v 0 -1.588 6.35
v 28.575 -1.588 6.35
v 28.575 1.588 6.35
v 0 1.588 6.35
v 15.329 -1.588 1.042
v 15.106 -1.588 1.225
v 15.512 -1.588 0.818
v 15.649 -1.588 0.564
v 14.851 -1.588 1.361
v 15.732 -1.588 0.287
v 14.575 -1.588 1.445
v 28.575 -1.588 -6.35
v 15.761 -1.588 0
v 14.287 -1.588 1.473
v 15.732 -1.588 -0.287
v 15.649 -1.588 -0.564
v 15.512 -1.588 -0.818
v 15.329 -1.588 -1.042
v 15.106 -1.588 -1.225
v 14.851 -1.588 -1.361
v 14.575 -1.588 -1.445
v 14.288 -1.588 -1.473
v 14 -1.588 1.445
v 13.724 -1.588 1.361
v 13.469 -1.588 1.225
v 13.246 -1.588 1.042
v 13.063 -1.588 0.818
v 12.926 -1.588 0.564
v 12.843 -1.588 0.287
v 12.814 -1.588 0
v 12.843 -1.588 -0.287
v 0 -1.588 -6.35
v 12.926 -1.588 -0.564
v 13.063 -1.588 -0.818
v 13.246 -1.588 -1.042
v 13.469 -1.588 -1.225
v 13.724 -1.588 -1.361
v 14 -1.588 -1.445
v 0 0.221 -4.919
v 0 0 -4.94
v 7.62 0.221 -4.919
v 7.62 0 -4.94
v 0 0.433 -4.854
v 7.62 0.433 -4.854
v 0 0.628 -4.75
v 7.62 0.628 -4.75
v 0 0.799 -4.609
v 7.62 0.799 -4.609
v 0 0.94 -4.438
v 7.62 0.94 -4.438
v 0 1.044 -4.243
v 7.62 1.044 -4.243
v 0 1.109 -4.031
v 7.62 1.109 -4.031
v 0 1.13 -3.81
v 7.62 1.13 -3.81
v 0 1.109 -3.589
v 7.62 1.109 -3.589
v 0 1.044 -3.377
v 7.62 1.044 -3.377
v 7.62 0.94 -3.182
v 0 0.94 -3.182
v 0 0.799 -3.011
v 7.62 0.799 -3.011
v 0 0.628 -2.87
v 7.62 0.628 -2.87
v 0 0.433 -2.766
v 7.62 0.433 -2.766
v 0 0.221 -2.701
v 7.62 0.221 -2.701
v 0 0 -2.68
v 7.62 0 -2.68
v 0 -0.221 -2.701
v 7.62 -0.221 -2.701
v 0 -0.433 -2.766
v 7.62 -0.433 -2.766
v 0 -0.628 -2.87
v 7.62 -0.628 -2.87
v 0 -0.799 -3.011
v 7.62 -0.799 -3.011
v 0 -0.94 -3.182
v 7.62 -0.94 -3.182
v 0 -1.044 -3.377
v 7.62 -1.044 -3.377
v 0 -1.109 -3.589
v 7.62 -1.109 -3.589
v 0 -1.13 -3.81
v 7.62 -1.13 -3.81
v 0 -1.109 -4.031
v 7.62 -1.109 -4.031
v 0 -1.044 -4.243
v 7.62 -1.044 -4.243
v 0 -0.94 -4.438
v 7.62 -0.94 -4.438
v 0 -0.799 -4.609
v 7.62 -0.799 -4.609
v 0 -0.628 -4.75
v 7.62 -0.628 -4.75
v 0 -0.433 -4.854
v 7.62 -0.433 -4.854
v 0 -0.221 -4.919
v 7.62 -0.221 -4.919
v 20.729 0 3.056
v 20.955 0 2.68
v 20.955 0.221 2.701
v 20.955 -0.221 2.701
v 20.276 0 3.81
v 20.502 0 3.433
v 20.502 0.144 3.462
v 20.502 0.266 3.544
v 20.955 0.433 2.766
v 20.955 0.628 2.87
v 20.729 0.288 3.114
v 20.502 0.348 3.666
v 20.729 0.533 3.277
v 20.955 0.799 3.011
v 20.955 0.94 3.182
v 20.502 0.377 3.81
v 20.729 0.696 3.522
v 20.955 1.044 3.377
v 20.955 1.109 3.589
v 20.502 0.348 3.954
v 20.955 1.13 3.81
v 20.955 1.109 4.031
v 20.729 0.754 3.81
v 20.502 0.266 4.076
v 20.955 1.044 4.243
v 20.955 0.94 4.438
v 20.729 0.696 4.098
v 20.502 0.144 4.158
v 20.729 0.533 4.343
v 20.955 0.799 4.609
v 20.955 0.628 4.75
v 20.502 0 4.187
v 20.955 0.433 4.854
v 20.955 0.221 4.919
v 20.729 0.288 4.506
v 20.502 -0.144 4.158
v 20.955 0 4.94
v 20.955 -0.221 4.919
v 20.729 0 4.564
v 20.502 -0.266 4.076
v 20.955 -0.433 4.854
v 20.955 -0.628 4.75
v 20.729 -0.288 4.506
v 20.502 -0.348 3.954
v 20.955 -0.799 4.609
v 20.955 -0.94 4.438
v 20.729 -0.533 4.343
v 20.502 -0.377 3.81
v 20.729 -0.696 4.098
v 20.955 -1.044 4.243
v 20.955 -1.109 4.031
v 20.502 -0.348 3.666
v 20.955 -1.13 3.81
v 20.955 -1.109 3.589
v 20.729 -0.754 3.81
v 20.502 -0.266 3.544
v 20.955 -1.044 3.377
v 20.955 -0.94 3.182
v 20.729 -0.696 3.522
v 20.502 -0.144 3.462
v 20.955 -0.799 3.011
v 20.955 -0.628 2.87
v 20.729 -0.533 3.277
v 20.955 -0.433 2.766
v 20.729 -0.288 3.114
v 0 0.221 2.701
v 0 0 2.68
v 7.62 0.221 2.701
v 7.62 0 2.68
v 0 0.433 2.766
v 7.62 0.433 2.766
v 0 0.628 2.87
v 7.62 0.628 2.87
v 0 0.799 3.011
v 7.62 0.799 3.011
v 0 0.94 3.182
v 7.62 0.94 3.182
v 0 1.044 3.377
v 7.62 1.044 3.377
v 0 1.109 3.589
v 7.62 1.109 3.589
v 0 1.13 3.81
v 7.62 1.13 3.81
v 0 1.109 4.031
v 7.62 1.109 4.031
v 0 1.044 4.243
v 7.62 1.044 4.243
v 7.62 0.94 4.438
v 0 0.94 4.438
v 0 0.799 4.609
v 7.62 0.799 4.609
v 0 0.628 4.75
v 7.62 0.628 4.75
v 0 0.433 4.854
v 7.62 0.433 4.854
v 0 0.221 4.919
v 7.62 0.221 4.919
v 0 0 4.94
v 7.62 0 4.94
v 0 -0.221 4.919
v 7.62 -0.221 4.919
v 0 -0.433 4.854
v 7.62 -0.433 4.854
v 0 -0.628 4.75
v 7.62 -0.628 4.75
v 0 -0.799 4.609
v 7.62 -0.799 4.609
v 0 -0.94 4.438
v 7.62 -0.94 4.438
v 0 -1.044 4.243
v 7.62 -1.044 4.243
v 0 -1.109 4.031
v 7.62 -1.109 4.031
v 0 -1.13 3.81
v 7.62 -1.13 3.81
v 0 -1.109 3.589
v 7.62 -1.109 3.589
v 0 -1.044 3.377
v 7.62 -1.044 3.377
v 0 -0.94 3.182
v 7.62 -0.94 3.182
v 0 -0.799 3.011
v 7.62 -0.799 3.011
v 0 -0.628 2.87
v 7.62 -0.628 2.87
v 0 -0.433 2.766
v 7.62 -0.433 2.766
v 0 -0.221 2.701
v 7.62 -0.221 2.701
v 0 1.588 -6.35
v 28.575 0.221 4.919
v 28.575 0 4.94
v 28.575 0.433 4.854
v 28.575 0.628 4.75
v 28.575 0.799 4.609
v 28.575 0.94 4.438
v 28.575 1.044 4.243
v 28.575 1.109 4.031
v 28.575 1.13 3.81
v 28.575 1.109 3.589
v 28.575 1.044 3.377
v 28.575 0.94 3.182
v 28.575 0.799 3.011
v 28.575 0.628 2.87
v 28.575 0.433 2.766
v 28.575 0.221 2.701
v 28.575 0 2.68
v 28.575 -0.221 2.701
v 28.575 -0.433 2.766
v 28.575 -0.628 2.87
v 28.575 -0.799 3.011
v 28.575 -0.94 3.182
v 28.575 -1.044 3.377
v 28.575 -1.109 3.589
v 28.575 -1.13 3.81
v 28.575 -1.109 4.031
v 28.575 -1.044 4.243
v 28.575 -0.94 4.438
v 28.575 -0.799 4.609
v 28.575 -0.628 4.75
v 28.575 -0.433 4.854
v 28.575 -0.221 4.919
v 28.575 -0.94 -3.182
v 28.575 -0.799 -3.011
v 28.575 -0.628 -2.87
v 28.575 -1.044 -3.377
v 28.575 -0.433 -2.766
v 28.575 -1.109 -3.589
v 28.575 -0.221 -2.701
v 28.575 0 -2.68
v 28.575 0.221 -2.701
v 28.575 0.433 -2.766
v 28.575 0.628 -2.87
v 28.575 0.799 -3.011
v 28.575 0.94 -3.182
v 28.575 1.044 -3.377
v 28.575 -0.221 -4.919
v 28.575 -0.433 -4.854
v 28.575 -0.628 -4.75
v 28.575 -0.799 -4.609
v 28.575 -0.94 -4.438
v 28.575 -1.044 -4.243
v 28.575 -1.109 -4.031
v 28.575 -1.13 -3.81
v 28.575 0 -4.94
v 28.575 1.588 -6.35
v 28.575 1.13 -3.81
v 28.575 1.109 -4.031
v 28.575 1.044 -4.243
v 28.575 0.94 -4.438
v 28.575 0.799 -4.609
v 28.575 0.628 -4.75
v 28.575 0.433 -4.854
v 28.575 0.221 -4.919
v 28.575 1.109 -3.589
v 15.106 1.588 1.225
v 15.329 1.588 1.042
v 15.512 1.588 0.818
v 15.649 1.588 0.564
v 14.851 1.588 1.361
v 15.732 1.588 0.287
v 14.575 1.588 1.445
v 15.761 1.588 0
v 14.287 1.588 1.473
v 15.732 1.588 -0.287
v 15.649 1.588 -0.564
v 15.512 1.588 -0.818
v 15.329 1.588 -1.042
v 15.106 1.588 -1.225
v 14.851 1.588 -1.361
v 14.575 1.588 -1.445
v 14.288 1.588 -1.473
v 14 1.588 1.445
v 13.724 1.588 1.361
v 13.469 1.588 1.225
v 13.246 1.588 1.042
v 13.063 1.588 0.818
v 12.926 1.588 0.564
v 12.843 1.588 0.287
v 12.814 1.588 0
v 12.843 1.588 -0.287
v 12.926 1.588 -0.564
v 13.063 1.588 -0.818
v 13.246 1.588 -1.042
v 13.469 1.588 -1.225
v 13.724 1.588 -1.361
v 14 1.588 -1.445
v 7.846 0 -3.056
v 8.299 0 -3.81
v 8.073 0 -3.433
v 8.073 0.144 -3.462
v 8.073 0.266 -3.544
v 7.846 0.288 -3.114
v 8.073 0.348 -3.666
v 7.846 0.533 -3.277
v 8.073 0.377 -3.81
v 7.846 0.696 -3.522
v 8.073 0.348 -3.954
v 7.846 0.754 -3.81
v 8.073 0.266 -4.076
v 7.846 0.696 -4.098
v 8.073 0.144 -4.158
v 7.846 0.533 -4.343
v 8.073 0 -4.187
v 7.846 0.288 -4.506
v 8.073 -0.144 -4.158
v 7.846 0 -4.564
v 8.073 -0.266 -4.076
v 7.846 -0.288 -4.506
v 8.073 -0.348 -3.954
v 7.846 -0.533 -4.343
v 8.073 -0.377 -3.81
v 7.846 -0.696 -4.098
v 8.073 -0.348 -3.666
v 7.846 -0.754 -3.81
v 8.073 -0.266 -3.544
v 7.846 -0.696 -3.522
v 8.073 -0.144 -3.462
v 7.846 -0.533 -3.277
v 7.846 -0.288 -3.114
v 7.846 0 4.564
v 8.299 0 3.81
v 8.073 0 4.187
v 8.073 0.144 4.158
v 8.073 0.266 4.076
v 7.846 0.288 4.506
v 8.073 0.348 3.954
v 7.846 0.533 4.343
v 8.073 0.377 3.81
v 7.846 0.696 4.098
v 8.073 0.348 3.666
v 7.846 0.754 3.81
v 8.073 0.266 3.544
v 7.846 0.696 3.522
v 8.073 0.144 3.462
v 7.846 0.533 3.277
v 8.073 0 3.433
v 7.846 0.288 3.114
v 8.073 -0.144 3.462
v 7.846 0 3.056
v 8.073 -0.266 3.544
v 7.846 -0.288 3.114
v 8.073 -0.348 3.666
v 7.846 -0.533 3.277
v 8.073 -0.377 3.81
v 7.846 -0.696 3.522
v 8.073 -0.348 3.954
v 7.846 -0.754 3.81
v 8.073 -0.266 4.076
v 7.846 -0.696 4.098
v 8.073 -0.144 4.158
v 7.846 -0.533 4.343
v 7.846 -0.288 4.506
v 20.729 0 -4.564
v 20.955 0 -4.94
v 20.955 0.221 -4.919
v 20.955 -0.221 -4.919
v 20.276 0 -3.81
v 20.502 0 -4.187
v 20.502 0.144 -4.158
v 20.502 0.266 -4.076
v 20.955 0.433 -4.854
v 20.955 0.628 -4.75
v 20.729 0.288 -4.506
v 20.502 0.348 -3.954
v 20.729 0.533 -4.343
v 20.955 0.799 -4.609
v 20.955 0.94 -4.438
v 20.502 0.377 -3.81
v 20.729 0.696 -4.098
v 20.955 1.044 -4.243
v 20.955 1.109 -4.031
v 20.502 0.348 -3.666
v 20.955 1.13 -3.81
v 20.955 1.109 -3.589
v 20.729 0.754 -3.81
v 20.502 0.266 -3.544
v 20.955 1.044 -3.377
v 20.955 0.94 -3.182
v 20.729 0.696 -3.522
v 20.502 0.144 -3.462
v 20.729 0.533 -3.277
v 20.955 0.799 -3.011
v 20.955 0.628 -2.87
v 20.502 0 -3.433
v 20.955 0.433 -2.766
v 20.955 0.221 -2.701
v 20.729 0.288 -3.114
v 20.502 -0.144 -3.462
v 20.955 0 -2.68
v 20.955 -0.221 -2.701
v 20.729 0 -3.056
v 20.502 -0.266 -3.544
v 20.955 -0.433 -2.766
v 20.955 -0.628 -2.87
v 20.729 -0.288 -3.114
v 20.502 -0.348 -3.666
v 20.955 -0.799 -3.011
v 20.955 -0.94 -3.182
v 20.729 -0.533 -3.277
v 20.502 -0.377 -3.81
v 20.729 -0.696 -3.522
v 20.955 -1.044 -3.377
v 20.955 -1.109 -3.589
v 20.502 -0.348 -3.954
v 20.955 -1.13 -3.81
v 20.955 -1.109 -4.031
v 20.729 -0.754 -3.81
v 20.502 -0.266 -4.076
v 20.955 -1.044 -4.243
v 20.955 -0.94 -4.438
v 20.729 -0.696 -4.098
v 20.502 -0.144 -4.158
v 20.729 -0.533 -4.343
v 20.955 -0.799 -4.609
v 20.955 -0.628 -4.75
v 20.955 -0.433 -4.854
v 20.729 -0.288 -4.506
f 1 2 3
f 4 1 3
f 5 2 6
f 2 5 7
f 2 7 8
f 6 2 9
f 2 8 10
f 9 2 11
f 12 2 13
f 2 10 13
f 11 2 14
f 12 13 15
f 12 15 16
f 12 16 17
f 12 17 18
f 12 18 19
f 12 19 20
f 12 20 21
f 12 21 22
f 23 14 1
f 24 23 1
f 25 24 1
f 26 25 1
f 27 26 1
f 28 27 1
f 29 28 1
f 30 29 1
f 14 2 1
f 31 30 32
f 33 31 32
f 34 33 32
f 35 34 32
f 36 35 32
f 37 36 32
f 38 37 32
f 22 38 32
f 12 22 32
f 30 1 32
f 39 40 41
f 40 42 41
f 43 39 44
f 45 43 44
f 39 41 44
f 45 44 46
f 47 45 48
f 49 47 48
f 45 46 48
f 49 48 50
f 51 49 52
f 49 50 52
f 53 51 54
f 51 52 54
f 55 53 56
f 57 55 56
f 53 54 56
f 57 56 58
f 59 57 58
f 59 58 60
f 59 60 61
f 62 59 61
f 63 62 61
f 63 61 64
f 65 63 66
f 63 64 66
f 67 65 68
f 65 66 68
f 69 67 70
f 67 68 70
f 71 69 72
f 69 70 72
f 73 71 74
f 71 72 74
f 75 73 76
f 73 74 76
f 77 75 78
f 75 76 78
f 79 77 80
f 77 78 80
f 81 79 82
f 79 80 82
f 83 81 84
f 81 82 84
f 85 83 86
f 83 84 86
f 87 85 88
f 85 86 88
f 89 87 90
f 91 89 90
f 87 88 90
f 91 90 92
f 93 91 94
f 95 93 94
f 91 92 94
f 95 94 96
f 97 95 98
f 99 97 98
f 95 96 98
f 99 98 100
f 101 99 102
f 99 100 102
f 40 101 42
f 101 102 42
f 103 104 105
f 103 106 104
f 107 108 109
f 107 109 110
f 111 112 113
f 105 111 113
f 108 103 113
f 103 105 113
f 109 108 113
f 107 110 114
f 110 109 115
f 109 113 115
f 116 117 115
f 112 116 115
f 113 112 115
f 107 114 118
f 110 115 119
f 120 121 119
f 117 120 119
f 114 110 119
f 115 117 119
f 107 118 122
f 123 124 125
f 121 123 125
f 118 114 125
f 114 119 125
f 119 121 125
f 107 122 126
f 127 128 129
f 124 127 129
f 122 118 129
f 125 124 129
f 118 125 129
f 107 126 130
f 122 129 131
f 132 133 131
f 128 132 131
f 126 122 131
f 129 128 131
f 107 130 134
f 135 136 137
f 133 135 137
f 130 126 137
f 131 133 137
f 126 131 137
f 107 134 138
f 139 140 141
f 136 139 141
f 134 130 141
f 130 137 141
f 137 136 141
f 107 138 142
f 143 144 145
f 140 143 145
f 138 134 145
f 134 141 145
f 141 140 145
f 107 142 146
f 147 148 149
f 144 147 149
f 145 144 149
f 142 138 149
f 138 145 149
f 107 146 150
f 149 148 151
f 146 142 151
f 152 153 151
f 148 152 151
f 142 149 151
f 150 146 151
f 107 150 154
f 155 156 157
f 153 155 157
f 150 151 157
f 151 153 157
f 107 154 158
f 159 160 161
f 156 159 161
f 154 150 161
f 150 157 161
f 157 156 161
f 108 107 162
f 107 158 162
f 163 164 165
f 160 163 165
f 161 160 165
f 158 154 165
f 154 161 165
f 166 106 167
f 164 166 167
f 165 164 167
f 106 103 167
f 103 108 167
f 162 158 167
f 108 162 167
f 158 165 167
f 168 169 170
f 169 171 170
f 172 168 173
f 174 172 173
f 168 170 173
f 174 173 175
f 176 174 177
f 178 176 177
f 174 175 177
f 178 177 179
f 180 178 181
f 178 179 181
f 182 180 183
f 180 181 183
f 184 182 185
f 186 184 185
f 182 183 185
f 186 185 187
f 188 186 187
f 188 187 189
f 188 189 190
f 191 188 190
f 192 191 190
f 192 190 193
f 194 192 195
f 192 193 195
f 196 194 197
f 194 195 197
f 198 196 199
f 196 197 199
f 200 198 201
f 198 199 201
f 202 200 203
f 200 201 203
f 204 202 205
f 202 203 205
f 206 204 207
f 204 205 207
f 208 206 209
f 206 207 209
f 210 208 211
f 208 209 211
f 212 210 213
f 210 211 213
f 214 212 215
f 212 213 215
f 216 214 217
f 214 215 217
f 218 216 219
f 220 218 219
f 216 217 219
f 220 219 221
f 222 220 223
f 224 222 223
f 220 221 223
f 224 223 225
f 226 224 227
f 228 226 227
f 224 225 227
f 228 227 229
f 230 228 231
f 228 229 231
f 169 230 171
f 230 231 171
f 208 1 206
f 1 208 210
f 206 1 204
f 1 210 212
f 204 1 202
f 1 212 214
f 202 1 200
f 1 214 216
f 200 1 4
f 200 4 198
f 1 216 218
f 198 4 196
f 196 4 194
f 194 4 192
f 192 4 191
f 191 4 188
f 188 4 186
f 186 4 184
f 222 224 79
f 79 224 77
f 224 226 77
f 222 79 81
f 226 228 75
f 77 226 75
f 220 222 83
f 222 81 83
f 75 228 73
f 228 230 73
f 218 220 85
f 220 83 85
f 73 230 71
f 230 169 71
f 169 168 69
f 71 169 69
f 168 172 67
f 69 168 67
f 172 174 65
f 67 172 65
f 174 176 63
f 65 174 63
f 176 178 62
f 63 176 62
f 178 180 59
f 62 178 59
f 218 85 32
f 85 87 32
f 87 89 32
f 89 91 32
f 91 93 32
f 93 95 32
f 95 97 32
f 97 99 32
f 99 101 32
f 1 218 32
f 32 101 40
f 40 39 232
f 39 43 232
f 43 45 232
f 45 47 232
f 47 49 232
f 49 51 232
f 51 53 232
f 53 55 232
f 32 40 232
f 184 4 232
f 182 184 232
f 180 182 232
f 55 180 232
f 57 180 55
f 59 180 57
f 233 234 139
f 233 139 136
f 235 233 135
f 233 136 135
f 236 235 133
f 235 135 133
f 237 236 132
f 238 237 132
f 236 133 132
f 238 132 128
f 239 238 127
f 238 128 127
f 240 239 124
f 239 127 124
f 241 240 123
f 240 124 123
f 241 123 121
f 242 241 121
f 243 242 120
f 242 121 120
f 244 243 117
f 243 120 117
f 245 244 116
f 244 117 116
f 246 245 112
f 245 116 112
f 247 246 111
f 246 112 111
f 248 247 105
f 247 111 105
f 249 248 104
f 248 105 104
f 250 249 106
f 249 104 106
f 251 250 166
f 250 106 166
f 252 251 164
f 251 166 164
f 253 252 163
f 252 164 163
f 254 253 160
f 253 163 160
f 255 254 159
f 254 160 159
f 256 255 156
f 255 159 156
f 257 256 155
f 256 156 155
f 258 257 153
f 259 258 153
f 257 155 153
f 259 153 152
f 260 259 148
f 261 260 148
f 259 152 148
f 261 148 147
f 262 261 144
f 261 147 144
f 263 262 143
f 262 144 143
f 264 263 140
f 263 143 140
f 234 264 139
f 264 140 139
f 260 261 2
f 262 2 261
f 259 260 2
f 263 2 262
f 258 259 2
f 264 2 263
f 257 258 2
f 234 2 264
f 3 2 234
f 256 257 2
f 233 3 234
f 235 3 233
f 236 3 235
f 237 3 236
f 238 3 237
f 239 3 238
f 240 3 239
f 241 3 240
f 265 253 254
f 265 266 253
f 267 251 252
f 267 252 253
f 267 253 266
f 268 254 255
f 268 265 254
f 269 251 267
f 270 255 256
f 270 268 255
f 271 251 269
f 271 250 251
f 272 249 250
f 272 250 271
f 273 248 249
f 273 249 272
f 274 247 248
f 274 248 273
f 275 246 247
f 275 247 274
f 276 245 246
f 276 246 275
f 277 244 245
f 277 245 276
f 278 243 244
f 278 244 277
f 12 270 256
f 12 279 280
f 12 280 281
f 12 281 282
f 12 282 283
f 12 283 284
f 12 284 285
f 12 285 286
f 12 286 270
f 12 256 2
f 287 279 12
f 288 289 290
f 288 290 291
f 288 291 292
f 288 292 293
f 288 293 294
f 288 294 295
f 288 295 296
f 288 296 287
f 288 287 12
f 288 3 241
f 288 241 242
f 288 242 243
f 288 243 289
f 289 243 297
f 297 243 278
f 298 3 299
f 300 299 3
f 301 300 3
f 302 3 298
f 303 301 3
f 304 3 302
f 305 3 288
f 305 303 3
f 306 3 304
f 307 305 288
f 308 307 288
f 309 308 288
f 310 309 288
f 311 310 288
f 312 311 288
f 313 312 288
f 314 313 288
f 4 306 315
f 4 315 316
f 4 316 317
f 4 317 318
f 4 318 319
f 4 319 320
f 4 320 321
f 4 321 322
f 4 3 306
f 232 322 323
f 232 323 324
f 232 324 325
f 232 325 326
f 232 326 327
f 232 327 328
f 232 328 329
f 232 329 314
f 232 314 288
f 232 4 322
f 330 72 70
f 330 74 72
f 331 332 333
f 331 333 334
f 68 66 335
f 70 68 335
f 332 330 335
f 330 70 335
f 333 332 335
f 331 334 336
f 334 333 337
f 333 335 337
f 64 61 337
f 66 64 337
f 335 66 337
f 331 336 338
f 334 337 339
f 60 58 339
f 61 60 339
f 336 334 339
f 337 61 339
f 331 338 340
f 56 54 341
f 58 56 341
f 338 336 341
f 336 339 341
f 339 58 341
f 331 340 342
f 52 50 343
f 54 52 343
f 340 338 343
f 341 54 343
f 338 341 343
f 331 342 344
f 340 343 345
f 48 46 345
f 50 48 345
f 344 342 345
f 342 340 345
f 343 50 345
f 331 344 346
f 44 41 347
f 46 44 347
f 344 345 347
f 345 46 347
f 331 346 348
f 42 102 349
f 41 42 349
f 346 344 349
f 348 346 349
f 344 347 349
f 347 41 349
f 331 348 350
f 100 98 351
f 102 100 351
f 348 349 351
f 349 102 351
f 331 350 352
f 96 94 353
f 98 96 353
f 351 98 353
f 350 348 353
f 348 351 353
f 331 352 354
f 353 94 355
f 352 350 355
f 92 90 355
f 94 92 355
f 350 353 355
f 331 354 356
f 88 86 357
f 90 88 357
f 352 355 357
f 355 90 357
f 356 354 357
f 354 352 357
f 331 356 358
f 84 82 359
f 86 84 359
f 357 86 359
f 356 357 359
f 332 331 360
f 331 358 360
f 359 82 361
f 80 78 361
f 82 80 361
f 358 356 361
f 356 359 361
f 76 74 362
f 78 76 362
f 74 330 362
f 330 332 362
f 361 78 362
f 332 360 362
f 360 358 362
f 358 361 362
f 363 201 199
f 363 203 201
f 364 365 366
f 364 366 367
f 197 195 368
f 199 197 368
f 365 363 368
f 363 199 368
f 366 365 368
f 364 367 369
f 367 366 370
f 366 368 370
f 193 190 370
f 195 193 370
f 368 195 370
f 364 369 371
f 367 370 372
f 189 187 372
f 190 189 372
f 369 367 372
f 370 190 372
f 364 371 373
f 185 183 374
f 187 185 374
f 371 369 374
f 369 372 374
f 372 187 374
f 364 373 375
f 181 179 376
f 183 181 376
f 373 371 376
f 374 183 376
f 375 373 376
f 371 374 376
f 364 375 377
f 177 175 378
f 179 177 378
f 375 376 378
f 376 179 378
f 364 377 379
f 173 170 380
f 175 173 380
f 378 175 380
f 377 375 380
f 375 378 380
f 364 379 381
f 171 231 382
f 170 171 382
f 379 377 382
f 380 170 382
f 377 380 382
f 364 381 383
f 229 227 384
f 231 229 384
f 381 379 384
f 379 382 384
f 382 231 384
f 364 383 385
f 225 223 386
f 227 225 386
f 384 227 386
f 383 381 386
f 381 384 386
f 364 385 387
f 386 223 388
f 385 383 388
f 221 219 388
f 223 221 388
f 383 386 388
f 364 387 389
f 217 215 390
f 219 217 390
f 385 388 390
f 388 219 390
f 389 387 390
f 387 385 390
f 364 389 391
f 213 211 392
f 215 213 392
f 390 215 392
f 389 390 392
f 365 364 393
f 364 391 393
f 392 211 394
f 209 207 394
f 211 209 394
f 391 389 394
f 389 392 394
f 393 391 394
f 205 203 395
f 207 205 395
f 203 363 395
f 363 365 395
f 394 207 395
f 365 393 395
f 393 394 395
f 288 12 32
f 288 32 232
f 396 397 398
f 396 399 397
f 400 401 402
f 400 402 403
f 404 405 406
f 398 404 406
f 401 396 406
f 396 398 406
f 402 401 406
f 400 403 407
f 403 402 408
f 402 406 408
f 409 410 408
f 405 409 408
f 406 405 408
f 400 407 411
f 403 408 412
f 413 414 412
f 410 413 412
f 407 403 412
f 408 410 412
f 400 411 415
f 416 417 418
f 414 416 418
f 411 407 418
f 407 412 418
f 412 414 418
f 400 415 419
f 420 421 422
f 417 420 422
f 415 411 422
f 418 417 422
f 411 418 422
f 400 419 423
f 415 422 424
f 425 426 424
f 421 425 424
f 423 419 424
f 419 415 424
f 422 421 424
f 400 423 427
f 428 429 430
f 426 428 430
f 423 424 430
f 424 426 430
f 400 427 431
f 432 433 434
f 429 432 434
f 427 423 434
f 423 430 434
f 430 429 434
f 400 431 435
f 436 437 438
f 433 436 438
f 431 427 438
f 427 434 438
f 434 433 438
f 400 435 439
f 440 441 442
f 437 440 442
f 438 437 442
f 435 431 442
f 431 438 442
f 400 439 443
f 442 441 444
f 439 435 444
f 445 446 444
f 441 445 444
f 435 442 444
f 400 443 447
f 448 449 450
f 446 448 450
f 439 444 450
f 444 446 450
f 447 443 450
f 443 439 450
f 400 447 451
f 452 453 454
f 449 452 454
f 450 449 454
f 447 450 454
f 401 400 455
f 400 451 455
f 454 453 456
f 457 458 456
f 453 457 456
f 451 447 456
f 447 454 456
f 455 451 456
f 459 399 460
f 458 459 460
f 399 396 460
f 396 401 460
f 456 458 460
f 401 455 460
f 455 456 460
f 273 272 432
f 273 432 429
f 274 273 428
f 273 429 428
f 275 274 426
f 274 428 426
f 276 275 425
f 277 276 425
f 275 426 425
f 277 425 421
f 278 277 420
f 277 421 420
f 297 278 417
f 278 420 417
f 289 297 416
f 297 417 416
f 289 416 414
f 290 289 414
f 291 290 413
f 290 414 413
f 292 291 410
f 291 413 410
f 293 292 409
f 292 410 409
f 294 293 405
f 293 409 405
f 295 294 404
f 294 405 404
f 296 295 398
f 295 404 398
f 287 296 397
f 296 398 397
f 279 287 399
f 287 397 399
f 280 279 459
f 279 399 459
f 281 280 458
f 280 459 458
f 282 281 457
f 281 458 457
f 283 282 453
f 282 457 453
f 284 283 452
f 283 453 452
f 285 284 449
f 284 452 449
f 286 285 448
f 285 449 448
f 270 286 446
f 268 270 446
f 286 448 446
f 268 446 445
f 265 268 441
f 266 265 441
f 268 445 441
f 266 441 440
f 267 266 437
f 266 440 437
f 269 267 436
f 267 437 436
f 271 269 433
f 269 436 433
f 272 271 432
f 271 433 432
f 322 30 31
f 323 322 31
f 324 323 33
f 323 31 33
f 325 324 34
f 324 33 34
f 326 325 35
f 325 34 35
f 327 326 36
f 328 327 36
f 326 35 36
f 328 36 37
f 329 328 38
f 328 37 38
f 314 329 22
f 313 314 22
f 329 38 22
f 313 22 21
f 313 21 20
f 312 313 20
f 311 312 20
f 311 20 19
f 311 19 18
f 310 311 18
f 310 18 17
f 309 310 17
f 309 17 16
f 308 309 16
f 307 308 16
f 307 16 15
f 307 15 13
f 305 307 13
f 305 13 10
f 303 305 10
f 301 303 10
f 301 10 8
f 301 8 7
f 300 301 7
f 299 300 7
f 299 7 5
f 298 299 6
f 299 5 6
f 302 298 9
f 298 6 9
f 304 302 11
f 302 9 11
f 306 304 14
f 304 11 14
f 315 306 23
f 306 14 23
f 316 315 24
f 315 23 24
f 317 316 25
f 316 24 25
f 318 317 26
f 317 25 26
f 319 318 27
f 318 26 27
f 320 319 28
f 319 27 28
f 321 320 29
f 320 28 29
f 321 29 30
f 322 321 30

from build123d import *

# Parameters (mm, degrees)
SKETCH1_W                 = 12.7
SKETCH1_H                 = 3.175
BOSS_EXTRUDE1_DEPTH       = 28.575
F_4_CLEARANCE_HOLE1_D     = 2.9464
F_4_CLEARANCE_HOLE1_DEPTH = 3.302
F_4_CLEARANCE_HOLE1_TIP   = 0.885187864
F_4_40_TAPPED_HOLE1_D     = 2.2606
F_4_40_TAPPED_HOLE1_DEPTH = 7.62
F_4_40_TAPPED_HOLE1_TIP   = 0.679152758
F_4_40_TAPPED_HOLE2_D     = 2.2606
F_4_40_TAPPED_HOLE2_DEPTH = 7.62
F_4_40_TAPPED_HOLE2_TIP   = 0.679152758


with BuildPart() as part:
    # Sketch1 → Boss-Extrude1 (new body)
    with BuildSketch(Plane(origin=(0, 0, 0), x_dir=(0, 0, -1), z_dir=(1, 0, 0))):
        Rectangle(SKETCH1_W, SKETCH1_H)
    extrude(amount=BOSS_EXTRUDE1_DEPTH)

    # #4 Clearance Hole1
    with Locations(Plane(origin=(0, 1.5875, 0), x_dir=(1, 0, 0), z_dir=(0, 1, 0))):
        with Locations((14.2875, 0)):
            Hole(F_4_CLEARANCE_HOLE1_D / 2, depth=F_4_CLEARANCE_HOLE1_DEPTH)
            with Locations((0, 0, -(F_4_CLEARANCE_HOLE1_DEPTH + F_4_CLEARANCE_HOLE1_TIP / 2))):  # 118° drill point
                Cone(0, F_4_CLEARANCE_HOLE1_D / 2, F_4_CLEARANCE_HOLE1_TIP, mode=Mode.SUBTRACT)

    # #4-40 Tapped Hole1
    with Locations(Plane.ZY):
        with Locations((-3.81, 0), (3.81, 0)):
            Hole(F_4_40_TAPPED_HOLE1_D / 2, depth=F_4_40_TAPPED_HOLE1_DEPTH)
            with Locations((0, 0, -(F_4_40_TAPPED_HOLE1_DEPTH + F_4_40_TAPPED_HOLE1_TIP / 2))):  # 118° drill point
                Cone(0, F_4_40_TAPPED_HOLE1_D / 2, F_4_40_TAPPED_HOLE1_TIP, mode=Mode.SUBTRACT)

    # #4-40 Tapped Hole2
    with Locations(Plane(origin=(28.575, 0, 0), x_dir=(0, 0, -1), z_dir=(1, 0, 0))):
        with Locations((-3.81, 0), (3.81, 0)):
            Hole(F_4_40_TAPPED_HOLE2_D / 2, depth=F_4_40_TAPPED_HOLE2_DEPTH)
            with Locations((0, 0, -(F_4_40_TAPPED_HOLE2_DEPTH + F_4_40_TAPPED_HOLE2_TIP / 2))):  # 118° drill point
                Cone(0, F_4_40_TAPPED_HOLE2_D / 2, F_4_40_TAPPED_HOLE2_TIP, mode=Mode.SUBTRACT)


solid = part.part
